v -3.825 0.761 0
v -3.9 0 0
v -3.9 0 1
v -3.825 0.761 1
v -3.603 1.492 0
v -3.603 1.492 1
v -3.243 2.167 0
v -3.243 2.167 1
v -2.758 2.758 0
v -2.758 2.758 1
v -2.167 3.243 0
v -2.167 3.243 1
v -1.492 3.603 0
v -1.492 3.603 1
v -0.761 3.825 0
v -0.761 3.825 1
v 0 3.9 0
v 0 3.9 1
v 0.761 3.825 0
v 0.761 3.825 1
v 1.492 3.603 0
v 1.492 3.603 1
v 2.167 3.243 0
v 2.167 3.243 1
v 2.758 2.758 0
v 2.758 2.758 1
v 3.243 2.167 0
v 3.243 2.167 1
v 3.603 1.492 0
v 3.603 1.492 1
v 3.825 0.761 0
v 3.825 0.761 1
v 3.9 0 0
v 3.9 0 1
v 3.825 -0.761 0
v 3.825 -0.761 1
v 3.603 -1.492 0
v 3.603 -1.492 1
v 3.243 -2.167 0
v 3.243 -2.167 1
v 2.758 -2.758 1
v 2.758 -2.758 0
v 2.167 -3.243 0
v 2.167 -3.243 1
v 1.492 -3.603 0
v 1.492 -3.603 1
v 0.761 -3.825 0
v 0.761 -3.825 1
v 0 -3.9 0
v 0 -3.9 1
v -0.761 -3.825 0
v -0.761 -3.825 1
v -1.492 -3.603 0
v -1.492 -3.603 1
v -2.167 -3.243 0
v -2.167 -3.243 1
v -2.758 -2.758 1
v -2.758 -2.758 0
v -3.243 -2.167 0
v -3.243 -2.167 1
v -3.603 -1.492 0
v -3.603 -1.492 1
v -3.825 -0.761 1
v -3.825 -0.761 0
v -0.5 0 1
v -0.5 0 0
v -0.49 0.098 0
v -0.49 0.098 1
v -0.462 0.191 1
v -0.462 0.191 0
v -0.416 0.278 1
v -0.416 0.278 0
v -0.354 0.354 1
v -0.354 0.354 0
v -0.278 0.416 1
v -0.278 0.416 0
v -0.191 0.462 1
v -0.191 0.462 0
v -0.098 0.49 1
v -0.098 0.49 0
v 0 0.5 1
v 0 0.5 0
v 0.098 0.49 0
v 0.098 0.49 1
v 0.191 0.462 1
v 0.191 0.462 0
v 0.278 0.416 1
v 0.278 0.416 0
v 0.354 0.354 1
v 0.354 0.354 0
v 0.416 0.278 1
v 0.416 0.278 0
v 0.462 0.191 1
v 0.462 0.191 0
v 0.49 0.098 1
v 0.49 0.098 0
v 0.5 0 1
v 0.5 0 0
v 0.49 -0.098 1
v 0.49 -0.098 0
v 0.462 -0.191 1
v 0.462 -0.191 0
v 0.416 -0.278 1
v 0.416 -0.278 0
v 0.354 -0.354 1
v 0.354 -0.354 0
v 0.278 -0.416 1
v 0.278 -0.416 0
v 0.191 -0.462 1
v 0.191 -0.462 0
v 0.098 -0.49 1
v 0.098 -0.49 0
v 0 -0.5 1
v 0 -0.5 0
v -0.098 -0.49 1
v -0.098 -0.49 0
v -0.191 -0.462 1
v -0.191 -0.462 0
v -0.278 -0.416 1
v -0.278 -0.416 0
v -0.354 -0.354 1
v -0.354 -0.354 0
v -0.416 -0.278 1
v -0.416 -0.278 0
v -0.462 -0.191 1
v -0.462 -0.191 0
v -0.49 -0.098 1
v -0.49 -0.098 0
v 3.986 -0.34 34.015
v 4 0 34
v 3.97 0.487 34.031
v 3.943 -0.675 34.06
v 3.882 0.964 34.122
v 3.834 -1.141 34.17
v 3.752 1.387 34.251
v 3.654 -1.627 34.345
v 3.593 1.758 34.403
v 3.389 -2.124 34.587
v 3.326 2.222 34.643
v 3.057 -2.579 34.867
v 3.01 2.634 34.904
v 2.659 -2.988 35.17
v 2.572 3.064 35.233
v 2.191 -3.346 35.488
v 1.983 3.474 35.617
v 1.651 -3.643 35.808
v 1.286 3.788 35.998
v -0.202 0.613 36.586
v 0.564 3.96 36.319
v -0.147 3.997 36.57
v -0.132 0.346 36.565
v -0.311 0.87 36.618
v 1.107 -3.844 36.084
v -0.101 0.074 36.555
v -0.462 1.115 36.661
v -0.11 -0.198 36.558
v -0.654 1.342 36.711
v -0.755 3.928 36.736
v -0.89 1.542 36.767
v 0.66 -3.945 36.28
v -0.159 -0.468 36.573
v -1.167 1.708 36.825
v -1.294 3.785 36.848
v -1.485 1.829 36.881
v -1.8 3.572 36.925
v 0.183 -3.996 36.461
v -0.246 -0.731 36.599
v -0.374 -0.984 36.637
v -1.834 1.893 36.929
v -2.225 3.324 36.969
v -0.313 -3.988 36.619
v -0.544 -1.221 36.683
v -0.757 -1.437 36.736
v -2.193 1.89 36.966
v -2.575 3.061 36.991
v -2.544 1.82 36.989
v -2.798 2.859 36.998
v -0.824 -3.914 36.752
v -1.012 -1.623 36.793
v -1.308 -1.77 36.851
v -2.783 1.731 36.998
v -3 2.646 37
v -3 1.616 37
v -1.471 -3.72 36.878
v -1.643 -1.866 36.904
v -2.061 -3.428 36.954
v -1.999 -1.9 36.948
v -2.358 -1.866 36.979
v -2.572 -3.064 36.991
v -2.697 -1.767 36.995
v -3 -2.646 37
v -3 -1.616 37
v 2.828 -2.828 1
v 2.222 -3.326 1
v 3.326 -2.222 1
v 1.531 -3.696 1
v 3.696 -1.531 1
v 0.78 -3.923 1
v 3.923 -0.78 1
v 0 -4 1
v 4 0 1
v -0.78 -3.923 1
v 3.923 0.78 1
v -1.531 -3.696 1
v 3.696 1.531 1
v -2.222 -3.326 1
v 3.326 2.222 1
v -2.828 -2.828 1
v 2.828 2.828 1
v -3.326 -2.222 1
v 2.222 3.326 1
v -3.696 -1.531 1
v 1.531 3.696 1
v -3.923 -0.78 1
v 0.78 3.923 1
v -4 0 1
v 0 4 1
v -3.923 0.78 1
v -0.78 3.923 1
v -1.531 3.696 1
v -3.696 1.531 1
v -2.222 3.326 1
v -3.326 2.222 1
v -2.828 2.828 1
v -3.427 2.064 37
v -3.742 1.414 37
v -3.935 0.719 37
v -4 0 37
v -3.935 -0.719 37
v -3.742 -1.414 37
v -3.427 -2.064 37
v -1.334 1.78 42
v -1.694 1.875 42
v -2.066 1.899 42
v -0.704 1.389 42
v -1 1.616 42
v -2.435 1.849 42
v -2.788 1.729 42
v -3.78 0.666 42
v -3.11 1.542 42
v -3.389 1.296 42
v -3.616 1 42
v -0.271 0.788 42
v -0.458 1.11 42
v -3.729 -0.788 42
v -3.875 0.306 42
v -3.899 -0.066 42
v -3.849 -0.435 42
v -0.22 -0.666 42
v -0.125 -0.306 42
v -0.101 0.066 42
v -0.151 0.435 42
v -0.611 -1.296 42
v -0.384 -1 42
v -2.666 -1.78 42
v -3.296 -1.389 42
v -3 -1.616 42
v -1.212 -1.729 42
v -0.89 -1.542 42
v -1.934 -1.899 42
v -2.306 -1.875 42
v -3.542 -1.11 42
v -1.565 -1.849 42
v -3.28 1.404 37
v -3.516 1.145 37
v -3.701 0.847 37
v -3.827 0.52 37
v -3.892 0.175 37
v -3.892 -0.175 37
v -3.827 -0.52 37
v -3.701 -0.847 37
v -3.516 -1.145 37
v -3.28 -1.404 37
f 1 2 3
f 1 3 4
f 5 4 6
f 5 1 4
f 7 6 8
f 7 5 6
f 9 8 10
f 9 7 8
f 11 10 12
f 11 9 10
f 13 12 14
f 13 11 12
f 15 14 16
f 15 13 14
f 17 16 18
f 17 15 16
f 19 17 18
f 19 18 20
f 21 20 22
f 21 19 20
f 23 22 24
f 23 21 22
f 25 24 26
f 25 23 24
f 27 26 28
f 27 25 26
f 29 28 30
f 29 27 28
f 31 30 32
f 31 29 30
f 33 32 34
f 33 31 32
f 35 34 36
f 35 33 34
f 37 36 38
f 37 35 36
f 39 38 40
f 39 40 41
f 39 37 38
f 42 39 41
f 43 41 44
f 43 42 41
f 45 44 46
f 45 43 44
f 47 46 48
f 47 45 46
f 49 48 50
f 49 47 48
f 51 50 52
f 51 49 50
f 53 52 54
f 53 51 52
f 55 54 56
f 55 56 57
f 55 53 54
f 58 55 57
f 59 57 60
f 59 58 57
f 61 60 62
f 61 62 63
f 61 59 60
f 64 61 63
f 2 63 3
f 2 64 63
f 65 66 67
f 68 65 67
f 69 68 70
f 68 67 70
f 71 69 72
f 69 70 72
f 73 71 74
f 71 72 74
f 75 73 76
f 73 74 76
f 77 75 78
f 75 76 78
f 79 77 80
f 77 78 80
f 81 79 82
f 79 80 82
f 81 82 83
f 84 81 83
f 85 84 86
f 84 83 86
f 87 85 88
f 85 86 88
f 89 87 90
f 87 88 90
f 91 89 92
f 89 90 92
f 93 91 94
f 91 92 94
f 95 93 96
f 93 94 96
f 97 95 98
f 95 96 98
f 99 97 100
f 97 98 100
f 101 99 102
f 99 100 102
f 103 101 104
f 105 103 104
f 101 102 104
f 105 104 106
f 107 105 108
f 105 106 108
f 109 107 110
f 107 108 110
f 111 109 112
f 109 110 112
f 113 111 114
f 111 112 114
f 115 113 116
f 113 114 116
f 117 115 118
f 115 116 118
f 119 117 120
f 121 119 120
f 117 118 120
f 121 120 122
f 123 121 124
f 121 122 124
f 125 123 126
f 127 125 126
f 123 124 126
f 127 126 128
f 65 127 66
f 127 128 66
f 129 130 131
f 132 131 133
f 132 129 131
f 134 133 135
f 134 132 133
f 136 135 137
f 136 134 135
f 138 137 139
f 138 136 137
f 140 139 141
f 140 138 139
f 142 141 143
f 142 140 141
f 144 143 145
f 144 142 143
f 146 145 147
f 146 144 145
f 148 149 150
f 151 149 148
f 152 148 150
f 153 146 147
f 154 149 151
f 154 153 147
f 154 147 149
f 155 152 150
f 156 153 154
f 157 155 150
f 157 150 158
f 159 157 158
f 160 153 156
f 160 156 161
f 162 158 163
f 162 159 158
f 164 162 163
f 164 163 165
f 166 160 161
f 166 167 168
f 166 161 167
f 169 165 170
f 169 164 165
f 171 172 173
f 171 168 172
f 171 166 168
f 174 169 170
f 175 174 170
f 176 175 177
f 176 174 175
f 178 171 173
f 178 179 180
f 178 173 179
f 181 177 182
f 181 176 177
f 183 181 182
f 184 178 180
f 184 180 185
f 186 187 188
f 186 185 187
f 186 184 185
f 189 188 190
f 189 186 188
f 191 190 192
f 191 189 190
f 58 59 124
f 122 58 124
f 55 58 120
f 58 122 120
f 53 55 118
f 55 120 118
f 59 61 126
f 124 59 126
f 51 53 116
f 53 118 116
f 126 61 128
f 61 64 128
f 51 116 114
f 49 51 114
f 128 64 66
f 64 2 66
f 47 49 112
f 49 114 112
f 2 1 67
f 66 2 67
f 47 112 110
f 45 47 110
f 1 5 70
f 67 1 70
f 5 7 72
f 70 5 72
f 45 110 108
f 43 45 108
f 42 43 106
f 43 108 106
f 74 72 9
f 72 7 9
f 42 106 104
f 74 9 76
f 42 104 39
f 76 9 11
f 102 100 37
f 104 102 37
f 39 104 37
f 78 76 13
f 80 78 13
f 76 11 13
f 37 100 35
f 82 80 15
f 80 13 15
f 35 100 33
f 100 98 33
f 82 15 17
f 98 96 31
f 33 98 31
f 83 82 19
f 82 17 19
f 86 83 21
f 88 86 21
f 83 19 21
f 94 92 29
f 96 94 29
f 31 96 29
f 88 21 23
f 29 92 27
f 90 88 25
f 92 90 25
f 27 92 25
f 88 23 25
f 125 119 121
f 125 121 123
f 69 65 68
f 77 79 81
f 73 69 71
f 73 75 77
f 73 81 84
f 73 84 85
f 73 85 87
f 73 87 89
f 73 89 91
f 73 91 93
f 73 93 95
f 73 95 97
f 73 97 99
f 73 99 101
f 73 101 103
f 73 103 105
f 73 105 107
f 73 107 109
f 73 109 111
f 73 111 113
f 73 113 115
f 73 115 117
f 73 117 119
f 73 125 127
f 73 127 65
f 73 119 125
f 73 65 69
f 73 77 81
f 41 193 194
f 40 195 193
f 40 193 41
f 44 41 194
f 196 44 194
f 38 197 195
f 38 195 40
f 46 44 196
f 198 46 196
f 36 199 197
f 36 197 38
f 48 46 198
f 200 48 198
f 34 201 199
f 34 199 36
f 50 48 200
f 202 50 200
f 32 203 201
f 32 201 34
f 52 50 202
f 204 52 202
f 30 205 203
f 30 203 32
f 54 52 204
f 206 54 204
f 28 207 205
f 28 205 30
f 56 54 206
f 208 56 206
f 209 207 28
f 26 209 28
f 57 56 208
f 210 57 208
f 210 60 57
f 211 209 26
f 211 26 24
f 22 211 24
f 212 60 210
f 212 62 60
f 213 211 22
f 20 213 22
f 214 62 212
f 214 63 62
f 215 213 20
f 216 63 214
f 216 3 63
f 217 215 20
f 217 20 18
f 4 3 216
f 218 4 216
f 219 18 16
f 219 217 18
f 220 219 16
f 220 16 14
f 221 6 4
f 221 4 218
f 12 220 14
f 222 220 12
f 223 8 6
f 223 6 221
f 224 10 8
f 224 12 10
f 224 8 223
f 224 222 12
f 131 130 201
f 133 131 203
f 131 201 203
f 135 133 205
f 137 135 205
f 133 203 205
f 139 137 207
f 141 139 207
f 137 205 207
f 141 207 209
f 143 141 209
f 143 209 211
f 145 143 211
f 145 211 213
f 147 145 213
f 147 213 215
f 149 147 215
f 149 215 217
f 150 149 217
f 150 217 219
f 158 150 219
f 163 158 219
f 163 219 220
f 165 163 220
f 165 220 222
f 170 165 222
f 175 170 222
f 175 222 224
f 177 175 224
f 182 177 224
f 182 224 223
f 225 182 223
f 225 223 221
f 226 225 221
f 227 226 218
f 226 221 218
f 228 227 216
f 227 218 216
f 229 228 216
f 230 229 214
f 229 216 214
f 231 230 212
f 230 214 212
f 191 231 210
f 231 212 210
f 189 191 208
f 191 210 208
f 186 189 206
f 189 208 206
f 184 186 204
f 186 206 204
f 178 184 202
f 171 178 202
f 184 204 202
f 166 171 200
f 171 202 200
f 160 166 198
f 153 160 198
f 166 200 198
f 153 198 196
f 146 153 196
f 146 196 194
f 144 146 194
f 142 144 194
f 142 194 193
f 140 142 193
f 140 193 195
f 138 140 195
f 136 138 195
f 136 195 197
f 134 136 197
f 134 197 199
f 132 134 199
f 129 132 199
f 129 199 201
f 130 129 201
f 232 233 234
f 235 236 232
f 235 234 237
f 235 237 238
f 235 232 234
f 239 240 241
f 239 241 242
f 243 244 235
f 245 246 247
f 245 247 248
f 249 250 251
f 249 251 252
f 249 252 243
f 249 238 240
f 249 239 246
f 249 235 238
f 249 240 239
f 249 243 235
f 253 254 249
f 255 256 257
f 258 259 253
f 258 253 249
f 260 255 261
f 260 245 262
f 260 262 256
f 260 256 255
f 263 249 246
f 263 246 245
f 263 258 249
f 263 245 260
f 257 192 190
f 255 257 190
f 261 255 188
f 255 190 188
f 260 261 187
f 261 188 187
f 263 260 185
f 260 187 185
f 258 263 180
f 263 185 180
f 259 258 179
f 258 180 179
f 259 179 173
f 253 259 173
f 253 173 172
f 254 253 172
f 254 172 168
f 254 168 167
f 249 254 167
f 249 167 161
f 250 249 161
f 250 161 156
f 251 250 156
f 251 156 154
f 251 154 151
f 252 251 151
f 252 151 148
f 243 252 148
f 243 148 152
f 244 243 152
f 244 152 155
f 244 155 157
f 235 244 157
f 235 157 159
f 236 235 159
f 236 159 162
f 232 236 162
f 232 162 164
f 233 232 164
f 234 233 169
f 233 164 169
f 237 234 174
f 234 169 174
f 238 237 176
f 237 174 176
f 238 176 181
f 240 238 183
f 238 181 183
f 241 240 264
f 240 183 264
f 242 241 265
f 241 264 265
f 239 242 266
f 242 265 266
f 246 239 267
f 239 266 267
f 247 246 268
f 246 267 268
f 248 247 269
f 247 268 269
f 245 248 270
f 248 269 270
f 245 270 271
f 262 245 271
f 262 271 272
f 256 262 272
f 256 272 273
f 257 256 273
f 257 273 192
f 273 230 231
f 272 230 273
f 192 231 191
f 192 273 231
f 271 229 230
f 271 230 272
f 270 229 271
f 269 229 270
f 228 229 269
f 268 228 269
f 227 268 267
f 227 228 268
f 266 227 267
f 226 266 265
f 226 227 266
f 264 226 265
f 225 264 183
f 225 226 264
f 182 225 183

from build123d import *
from build123d.topology import SkipClean

# Parameters (mm, degrees)
SKETCH_1_R                  = 4
EXTRUDE_1_DEPTH             = 37
SKETCH_2_R                  = 4
SKETCH_2_R_2                = 3.9
SKETCH_2_R_3                = 0.5
CUT_EXTRUDE_1_DEPTH         = 1
CUT_EXTRUDE_2_DEPTH         = 38.429934544
CUT_EXTRUDE_2_DEPTH_BACK    = 38.429934544
EXTRUDE_2_REACH             = 39.43
SKETCH_4_R                  = 1.9
EXTRUDE_2_DIRECTION_2_DEPTH = 5


with BuildPart() as part:
    # 草图1 → 凸台-拉伸1 (new body)
    with BuildSketch(Plane.XY):
        Circle(SKETCH_1_R)
    extrude(amount=EXTRUDE_1_DEPTH)

    # 草图2 → 切除-拉伸1 (cut)
    # profile 1 of 2: a face of its own
    with BuildSketch(Plane(origin=(0, 0, 0), x_dir=(-1, 0, 0), z_dir=(0, 0, -1))):
        Circle(SKETCH_2_R)
        Circle(SKETCH_2_R_2, mode=Mode.SUBTRACT)
    # profile 2 of 2: a face of its own
    with BuildSketch(Plane(origin=(0, 0, 0), x_dir=(-1, 0, 0), z_dir=(0, 0, -1))):
        Circle(SKETCH_2_R_3)
    extrude(amount=-CUT_EXTRUDE_1_DEPTH, mode=Mode.SUBTRACT)

    # 草图3 → 切除-拉伸2 (cut, two sides: drawn at the far end of the back side and taken through both)
    with BuildSketch(Plane(origin=(0, 0, 0), x_dir=(1, 0, 0), z_dir=(0, 1, 0)).offset(-CUT_EXTRUDE_2_DEPTH_BACK)):
        with BuildLine():
            Line((-3, -37), (4, -37))
            Line((4, -37), (4, -34))
            ThreePointArc((4, -34), (0.807886553, -36.218401957), (-3, -37))
        make_face()
    extrude(amount=CUT_EXTRUDE_2_DEPTH + CUT_EXTRUDE_2_DEPTH_BACK, mode=Mode.SUBTRACT)

    # 草图4 → 凸台-拉伸2 (add, up to next)
    with BuildSketch(Plane.XY.offset(37), mode=Mode.PRIVATE) as extrude_2_sk1:
        with Locations((-2, 0)):
            Circle(SKETCH_4_R)
    extrude_2_tool1 = extrude(extrude_2_sk1.sketch, amount=-EXTRUDE_2_REACH, mode=Mode.PRIVATE) - part.part
    add(extrude_2_tool1.solids().sort_by_distance((-2, 0, 37))[0])

    # 草图4 → 凸台-拉伸2 direction 2 (add)
    with SkipClean():  # the faces are left unmerged after this step: merging them gives an invalid solid
        with BuildSketch(Plane.XY.offset(37)):
            with Locations((-2, 0)):
                Circle(SKETCH_4_R)
        extrude(amount=EXTRUDE_2_DIRECTION_2_DEPTH)
    add(part.part.scale(1), mode=Mode.REPLACE)  # the faces are merged on a copy


solid = part.part
